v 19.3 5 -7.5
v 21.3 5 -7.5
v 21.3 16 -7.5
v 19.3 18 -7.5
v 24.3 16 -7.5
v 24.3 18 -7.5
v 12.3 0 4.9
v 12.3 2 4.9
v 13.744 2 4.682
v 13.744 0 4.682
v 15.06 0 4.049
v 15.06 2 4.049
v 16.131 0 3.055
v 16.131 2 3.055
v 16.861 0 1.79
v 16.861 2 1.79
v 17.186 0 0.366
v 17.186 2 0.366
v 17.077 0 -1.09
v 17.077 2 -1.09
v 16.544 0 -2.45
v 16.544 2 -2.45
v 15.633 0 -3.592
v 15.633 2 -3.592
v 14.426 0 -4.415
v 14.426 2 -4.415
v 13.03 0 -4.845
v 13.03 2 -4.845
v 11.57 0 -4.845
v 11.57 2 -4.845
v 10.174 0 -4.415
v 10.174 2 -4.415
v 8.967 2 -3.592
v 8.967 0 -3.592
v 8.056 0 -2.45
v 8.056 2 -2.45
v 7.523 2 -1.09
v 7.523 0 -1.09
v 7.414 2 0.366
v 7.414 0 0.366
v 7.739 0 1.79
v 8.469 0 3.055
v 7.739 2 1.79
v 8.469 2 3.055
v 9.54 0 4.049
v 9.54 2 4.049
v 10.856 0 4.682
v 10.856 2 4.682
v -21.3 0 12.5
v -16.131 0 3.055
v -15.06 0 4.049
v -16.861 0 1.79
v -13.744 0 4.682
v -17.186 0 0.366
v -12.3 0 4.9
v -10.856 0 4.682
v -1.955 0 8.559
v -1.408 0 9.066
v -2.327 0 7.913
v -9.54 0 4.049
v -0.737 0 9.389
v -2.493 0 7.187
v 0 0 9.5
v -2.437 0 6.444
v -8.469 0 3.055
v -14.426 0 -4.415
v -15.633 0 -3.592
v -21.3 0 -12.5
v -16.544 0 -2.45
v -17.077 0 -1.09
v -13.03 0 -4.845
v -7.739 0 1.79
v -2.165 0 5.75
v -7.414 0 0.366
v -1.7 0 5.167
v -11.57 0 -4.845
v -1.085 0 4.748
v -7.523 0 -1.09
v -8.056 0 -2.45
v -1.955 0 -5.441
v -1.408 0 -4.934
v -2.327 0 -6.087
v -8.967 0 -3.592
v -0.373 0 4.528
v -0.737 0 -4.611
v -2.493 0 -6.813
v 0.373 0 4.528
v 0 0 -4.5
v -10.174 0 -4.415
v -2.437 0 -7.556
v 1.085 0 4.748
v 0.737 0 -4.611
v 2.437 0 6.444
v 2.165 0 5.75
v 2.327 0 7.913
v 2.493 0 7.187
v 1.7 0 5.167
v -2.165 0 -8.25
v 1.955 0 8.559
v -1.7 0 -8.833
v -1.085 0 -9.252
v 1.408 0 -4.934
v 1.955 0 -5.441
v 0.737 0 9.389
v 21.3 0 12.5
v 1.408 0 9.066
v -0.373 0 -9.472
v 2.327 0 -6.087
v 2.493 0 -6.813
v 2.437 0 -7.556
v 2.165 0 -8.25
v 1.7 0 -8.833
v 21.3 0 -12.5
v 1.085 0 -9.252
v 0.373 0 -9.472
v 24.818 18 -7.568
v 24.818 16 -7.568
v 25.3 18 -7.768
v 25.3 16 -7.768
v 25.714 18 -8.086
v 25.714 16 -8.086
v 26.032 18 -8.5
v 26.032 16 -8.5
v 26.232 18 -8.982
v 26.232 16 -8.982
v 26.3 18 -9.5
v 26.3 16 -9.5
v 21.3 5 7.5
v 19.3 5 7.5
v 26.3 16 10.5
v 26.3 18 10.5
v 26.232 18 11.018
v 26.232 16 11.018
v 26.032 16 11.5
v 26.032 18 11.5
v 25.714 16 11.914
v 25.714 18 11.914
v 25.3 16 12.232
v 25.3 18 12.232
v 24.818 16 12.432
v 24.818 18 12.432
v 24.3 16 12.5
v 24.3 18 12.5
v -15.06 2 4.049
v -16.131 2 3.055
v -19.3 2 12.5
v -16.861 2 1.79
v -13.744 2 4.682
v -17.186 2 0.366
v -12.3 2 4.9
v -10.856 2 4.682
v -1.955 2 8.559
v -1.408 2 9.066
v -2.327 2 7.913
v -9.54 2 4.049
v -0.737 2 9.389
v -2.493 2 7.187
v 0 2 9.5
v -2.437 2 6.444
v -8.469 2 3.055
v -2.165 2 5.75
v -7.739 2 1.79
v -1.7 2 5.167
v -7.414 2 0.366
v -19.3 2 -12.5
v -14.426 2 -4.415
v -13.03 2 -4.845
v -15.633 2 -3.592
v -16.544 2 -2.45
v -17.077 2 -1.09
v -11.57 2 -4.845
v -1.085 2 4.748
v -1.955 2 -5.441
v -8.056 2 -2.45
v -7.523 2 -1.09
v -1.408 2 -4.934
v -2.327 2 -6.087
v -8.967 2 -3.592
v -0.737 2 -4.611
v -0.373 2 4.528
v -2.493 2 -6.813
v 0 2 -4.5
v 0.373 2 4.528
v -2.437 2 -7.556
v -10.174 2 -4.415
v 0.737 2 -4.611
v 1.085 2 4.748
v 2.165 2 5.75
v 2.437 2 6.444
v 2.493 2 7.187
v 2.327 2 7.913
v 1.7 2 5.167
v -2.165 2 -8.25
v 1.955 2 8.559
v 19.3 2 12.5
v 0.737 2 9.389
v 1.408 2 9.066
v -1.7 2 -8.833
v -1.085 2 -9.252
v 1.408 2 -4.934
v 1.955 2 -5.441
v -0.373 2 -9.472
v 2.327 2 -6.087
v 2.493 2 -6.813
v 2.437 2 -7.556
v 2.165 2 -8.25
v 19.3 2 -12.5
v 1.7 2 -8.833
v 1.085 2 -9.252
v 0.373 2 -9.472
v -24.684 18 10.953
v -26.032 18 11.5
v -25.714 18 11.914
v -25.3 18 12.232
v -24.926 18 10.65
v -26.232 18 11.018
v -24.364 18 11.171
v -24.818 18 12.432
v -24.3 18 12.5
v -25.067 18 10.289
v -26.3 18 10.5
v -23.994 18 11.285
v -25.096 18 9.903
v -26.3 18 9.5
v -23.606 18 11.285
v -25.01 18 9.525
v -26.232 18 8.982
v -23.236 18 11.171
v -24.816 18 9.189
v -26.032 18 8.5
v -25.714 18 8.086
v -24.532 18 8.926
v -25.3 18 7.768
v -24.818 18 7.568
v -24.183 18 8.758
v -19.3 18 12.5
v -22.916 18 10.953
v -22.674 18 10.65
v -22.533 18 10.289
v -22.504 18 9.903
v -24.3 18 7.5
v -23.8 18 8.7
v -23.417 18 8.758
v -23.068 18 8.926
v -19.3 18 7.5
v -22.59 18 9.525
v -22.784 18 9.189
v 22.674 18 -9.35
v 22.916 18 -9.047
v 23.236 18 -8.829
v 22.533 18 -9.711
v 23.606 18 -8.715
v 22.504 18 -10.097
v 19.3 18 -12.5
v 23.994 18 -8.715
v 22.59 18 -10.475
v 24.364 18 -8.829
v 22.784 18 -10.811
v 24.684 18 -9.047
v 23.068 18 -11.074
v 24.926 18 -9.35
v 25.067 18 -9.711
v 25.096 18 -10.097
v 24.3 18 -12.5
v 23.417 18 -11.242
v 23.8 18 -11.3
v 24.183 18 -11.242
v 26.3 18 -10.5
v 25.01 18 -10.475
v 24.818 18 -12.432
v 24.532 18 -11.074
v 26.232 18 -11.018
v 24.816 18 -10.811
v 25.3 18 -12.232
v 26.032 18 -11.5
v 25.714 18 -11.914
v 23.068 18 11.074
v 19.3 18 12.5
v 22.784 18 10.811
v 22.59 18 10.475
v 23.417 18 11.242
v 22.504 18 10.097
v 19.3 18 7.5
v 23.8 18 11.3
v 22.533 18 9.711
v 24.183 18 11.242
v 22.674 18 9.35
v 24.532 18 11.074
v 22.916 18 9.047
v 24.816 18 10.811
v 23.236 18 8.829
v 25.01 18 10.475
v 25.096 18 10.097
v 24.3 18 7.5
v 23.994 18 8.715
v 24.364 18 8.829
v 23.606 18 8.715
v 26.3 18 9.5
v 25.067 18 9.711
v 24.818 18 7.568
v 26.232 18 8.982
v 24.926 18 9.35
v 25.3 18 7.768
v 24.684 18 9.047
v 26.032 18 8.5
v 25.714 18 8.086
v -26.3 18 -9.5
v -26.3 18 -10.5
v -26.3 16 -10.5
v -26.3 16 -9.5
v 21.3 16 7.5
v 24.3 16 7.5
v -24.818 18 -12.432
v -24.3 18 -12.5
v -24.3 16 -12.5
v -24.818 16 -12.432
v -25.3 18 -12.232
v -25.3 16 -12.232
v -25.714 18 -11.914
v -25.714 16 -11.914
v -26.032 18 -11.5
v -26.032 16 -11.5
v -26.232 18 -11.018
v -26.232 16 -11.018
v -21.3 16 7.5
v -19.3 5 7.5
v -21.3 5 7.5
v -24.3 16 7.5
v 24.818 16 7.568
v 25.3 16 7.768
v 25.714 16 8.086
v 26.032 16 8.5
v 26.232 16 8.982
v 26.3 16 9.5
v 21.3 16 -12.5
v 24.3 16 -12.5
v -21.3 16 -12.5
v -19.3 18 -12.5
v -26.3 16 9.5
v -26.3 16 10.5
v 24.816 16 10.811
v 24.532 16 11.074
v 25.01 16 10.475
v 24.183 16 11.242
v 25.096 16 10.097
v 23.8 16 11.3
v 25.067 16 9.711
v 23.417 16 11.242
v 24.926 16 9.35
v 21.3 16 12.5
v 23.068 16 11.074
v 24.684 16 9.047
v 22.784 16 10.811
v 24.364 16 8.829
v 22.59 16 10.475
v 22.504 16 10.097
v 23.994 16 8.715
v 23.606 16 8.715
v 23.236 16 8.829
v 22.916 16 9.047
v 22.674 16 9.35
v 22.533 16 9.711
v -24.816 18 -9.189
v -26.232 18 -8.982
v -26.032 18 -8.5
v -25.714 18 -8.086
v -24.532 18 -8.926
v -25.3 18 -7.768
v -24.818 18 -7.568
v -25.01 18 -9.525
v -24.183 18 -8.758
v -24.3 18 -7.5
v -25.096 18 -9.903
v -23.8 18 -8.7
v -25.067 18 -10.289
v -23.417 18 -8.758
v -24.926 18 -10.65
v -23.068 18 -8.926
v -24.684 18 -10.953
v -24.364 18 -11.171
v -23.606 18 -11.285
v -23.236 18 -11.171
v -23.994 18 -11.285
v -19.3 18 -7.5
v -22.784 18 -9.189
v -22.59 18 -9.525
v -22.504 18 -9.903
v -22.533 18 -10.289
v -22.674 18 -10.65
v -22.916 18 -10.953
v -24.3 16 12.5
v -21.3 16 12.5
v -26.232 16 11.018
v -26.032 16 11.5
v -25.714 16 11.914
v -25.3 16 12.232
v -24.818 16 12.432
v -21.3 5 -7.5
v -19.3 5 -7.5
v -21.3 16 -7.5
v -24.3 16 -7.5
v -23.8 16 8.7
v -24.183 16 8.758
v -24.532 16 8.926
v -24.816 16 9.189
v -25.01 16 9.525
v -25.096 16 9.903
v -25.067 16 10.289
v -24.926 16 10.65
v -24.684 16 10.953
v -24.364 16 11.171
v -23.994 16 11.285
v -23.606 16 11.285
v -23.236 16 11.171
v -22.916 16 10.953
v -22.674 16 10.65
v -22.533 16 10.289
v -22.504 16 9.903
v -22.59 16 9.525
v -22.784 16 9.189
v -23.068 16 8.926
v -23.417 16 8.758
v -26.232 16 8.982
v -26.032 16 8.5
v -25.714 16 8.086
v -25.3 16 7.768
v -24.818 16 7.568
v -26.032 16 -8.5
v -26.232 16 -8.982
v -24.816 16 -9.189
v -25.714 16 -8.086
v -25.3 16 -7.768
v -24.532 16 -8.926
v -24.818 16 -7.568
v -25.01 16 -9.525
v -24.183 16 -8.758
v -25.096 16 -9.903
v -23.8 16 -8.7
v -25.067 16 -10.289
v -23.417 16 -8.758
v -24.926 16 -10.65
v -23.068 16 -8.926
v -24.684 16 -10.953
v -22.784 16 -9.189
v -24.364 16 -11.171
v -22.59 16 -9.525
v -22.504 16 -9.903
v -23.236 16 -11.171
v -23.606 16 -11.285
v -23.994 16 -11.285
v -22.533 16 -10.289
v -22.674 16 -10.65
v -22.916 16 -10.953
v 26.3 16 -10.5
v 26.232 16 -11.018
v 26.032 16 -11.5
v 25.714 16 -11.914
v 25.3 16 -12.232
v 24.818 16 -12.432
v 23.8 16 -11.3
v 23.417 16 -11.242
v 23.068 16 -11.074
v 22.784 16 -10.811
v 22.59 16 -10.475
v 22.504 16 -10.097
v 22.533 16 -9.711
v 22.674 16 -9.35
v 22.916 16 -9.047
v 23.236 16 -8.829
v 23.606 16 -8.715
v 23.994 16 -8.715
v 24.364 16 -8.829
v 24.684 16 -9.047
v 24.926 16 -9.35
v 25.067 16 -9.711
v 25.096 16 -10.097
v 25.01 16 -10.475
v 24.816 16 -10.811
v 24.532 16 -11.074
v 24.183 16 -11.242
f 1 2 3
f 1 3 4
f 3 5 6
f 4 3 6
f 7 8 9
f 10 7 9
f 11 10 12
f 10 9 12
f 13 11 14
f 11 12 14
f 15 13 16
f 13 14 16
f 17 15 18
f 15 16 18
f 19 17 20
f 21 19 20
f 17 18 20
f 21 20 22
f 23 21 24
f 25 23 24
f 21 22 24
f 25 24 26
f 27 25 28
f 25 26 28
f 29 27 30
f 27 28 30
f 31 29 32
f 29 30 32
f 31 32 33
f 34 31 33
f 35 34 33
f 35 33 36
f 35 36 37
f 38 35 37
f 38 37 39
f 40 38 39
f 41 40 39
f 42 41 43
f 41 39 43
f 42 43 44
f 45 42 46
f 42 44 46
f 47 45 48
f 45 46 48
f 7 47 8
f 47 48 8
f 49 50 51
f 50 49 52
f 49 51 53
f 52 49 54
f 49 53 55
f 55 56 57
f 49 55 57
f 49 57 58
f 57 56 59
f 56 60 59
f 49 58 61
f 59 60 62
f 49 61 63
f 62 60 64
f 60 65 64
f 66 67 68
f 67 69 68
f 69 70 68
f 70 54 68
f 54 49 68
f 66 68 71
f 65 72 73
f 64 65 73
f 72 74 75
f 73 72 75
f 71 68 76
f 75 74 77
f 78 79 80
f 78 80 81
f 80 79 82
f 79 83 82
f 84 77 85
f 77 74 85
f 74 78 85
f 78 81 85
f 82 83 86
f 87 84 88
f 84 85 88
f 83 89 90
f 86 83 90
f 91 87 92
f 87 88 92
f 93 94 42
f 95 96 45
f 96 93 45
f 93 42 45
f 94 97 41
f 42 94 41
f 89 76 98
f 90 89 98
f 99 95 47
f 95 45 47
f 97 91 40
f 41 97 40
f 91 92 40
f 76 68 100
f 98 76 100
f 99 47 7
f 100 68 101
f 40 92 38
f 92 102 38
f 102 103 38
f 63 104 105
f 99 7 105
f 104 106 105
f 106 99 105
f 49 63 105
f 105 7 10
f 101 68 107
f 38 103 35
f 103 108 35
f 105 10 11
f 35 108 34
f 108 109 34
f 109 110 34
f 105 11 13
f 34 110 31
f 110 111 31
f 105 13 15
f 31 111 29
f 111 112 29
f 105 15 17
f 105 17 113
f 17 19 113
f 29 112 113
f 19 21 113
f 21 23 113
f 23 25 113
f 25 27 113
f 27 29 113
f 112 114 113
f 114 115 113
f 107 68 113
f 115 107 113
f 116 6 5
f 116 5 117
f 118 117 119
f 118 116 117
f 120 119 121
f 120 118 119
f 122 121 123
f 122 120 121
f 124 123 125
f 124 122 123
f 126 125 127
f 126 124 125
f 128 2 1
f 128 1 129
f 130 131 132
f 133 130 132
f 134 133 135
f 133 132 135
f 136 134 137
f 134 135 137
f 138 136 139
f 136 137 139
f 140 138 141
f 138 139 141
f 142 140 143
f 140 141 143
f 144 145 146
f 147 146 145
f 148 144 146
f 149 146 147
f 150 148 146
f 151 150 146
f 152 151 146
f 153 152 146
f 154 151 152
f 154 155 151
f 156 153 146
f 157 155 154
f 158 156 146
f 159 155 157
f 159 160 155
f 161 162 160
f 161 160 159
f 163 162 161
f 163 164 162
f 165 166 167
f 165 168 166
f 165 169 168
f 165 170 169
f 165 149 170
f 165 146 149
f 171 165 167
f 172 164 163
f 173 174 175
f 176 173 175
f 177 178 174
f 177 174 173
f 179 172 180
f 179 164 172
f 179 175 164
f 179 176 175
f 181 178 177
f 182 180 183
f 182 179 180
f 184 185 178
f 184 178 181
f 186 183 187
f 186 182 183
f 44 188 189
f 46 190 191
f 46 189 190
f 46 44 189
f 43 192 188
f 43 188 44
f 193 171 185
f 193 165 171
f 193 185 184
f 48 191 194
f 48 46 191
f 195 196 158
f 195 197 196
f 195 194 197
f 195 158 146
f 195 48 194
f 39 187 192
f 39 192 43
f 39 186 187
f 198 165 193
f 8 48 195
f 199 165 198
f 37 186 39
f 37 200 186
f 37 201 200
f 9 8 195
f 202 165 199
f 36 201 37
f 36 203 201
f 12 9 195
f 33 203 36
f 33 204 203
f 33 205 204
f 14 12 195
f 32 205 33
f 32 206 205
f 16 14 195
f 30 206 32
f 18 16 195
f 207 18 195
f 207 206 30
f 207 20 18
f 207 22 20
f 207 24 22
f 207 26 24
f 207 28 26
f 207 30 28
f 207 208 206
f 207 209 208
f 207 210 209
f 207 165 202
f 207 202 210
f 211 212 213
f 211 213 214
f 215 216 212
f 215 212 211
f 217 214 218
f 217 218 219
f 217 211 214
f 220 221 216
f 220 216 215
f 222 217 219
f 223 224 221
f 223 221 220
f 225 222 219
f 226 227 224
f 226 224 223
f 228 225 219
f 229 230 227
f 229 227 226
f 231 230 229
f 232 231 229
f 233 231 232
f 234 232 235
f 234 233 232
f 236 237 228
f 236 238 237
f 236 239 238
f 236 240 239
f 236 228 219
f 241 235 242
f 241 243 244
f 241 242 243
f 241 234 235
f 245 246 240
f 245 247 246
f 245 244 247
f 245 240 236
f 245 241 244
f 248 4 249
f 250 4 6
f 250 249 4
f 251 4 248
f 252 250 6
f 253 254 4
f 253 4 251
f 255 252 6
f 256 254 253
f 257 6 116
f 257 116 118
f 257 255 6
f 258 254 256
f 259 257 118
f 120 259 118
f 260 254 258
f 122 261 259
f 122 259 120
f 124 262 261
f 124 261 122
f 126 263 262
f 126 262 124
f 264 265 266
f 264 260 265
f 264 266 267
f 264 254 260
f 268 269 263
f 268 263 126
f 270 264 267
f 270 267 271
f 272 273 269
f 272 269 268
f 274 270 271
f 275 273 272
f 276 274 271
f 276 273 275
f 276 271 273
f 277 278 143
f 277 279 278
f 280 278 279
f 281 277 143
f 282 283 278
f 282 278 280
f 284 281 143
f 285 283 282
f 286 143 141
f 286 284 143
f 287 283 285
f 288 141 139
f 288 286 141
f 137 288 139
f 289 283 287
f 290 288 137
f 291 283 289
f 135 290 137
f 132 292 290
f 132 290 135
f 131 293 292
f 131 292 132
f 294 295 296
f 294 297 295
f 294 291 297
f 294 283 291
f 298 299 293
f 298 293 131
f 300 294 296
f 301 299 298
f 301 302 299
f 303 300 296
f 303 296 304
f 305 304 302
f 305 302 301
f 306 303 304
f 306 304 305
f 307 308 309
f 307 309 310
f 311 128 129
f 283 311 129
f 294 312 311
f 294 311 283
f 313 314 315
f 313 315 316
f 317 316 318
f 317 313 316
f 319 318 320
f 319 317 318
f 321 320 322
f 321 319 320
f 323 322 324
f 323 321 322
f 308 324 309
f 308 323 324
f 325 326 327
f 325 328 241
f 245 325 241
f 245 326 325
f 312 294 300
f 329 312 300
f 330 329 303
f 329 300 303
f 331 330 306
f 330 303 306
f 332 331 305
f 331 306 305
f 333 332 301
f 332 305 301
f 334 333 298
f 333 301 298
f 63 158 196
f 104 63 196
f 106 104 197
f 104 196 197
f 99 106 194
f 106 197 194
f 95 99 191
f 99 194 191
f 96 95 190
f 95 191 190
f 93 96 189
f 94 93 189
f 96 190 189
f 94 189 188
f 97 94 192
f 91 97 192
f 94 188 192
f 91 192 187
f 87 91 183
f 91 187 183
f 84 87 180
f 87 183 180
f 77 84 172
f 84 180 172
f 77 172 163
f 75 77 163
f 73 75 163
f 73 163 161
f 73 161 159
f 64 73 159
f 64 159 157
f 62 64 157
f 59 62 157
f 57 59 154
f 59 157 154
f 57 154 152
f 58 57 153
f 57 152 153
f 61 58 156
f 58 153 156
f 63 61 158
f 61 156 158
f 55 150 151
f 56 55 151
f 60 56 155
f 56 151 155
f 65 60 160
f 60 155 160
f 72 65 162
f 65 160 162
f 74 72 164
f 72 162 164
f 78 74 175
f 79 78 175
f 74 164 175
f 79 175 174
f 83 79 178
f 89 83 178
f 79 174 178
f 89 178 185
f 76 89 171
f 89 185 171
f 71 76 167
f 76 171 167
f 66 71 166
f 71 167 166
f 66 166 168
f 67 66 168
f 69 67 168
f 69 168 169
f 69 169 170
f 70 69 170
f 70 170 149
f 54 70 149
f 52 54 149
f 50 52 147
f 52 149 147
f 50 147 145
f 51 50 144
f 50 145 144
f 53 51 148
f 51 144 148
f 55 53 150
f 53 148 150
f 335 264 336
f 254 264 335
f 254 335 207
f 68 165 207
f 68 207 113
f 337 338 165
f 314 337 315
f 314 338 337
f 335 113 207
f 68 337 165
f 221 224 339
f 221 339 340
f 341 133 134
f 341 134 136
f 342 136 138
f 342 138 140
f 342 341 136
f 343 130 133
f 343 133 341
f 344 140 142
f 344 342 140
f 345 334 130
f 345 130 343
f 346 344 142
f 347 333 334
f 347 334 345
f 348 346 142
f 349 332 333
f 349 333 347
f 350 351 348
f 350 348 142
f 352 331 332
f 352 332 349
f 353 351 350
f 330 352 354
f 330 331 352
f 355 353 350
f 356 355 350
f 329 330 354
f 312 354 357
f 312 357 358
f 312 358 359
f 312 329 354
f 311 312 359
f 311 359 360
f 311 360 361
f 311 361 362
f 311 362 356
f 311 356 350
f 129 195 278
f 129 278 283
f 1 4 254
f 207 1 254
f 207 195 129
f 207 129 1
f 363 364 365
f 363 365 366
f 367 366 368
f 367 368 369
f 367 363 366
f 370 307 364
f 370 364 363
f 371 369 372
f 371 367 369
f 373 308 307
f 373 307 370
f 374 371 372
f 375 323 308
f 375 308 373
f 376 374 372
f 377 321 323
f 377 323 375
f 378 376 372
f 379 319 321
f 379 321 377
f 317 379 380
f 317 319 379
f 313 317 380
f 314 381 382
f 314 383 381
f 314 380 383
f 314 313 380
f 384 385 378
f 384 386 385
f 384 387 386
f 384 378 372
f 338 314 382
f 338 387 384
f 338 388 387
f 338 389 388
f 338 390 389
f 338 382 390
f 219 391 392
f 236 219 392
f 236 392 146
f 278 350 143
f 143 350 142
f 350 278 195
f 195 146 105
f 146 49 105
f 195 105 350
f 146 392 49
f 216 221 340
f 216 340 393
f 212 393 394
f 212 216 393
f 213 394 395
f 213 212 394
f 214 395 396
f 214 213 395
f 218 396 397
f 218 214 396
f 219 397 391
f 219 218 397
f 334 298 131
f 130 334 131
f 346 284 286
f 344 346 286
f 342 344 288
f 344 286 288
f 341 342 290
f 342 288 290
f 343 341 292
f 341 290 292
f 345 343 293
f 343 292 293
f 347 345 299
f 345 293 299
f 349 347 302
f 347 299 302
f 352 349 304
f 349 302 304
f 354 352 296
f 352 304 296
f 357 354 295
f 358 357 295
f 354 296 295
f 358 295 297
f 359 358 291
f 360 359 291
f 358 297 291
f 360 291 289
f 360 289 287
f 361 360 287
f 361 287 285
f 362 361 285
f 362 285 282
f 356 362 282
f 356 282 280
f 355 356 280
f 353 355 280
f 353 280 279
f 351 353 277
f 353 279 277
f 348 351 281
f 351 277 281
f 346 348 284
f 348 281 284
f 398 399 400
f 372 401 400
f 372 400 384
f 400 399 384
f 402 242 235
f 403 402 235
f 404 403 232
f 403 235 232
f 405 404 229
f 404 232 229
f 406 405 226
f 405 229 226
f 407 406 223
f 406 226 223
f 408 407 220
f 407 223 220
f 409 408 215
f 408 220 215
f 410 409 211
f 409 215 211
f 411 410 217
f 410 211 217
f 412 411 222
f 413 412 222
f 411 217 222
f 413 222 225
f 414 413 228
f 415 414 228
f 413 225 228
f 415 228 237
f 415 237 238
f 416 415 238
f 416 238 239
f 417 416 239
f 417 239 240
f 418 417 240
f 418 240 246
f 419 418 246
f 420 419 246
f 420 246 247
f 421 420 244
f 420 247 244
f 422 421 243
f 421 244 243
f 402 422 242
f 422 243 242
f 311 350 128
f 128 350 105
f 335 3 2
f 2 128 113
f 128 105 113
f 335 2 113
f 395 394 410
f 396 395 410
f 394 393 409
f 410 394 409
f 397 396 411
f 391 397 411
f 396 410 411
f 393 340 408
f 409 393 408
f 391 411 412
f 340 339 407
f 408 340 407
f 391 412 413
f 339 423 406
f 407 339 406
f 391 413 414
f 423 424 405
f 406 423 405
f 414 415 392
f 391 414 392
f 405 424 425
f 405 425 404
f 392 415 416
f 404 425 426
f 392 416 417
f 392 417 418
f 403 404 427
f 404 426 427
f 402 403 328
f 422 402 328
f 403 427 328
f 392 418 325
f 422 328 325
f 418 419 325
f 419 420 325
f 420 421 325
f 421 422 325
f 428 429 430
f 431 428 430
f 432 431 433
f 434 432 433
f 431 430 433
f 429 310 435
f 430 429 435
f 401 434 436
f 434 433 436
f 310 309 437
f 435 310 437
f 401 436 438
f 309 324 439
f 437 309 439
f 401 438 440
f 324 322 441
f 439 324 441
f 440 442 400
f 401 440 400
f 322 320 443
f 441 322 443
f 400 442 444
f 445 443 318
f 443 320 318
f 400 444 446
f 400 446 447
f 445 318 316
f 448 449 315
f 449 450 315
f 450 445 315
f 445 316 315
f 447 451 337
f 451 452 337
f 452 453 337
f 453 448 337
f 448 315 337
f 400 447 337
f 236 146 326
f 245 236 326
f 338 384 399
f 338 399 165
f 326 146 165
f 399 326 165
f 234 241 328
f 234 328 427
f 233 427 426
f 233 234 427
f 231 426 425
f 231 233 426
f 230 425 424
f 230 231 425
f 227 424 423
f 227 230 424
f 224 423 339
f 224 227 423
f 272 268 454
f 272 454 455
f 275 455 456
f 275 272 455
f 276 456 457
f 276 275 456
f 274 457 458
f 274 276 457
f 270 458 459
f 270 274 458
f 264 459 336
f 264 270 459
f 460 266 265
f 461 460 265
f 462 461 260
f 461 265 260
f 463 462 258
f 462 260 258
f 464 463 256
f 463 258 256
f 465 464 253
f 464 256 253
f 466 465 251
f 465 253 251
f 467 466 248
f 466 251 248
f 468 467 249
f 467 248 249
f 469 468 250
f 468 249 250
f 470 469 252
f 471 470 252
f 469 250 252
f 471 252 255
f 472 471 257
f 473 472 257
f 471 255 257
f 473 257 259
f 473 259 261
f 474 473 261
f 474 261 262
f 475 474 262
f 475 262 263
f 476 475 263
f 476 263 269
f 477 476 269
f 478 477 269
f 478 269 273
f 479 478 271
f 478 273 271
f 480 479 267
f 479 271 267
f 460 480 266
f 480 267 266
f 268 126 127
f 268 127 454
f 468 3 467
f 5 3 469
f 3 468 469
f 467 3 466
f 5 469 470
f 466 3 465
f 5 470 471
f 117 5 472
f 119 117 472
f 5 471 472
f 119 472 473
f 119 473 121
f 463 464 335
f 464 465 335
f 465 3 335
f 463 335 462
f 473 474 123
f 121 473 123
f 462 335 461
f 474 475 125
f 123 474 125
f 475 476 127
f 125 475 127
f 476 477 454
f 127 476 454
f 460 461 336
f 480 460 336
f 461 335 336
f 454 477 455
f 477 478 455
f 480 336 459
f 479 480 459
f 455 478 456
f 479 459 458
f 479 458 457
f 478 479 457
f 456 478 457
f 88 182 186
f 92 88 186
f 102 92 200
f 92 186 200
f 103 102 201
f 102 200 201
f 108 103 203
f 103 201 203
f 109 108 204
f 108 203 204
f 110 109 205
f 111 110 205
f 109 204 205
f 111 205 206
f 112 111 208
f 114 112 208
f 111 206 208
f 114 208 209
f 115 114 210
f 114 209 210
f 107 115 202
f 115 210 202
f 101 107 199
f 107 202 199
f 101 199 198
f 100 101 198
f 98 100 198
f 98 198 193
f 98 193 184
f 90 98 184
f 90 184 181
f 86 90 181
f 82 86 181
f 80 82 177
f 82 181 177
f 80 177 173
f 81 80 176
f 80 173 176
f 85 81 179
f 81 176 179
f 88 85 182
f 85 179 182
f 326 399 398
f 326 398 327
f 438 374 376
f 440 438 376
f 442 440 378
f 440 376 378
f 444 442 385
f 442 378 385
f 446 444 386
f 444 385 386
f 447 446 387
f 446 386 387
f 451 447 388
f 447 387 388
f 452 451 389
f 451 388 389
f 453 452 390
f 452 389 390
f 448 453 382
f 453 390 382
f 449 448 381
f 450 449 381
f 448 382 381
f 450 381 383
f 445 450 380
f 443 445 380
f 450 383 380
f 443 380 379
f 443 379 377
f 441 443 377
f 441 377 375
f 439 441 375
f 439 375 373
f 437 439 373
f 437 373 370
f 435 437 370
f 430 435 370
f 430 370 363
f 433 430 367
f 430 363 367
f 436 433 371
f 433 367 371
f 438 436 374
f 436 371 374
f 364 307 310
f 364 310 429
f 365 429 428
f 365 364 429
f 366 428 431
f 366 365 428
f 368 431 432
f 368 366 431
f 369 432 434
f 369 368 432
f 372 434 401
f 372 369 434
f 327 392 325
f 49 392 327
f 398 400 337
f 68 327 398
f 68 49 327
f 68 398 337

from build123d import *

# Parameters (mm, degrees)
SZKIC1_W                        = 42.6
SZKIC1_H                        = 25
DODANIE_WYCI_GNI_CIE2_DEPTH     = 18
SKORUPA5_T                      = -2
SZKIC2_R                        = 1.3
DODANIE_WYCI_GNI_CIE3_DEPTH     = 2
SZKIC3_R                        = 4.9
SZKIC3_R_2                      = 2.5
WYTNIJ_WYCI_GNI_CIE1_DEPTH      = 2
WYTNIJ_WYCI_GNI_CIE2_DEPTH      = 53.402385442
WYTNIJ_WYCI_GNI_CIE2_DEPTH_BACK = 53.402385442
SZKIC4_W                        = 15
SZKIC4_H                        = 13


with BuildPart() as part:
    # Szkic1 → Dodanie-wyciągnięcie2 (new body)
    with BuildSketch(Plane(origin=(0, 0, 0), x_dir=(1, 0, 0), z_dir=(0, 1, 0))):
        Rectangle(SZKIC1_W, SZKIC1_H)
    extrude(amount=DODANIE_WYCI_GNI_CIE2_DEPTH)

    # Skorupa5
    skorupa5_openings = [part.faces().sort_by_distance(p)[0] for p in [
        (0, 18, 0),
        (0, 9, -12.5),
        (0, 9, 12.5),
    ]]
    offset(amount=SKORUPA5_T, openings=skorupa5_openings, kind=Kind.INTERSECTION)

    # Szkic2 → Dodanie-wyciągnięcie3 (add)
    # profile 1 of 4: a face of its own
    with BuildSketch(Plane(origin=(0, 18, 0), x_dir=(1, 0, 0), z_dir=(0, 1, 0))):
        with BuildLine():
            Line((-21.3, 12.5), (-24.3, 12.5))
            ThreePointArc((-24.3, 12.5), (-25.714213562, 11.914213562), (-26.3, 10.5))
            Line((-26.3, 10.5), (-26.3, 9.5))
            ThreePointArc((-26.3, 9.5), (-25.714213562, 8.085786438), (-24.3, 7.5))
            Line((-24.3, 7.5), (-21.3, 7.5))
            Line((-21.3, 7.5), (-21.3, 12.5))
        make_face()
        with Locations(Location((-23.8, 10, 0), (0, 0, 270))):
            Circle(SZKIC2_R, mode=Mode.SUBTRACT)
    # profile 2 of 4: a face of its own
    with BuildSketch(Plane(origin=(0, 18, 0), x_dir=(1, 0, 0), z_dir=(0, 1, 0))):
        with BuildLine():
            Line((-21.3, -7.5), (-24.3, -7.5))
            ThreePointArc((-24.3, -7.5), (-25.714213562, -8.085786438), (-26.3, -9.5))
            Line((-26.3, -9.5), (-26.3, -10.5))
            ThreePointArc((-26.3, -10.5), (-25.714213562, -11.914213562), (-24.3, -12.5))
            Line((-24.3, -12.5), (-21.3, -12.5))
            Line((-21.3, -12.5), (-21.3, -7.5))
        make_face()
        with Locations(Location((-23.8, -10, 0), (0, 0, 90))):
            Circle(SZKIC2_R, mode=Mode.SUBTRACT)
    # profile 3 of 4: a face of its own
    with BuildSketch(Plane(origin=(0, 18, 0), x_dir=(1, 0, 0), z_dir=(0, 1, 0))):
        with BuildLine():
            Line((21.3, -12.5), (21.3, -7.5))
            Line((21.3, -7.5), (24.3, -7.5))
            ThreePointArc((24.3, -7.5), (25.714213562, -8.085786438), (26.3, -9.5))
            Line((26.3, -9.5), (26.3, -10.5))
            ThreePointArc((26.3, -10.5), (25.714213562, -11.914213562), (24.3, -12.5))
            Line((24.3, -12.5), (21.3, -12.5))
        make_face()
        with Locations(Location((23.8, -10, 0), (0, 0, 270))):
            Circle(SZKIC2_R, mode=Mode.SUBTRACT)
    # profile 4 of 4: a face of its own
    with BuildSketch(Plane(origin=(0, 18, 0), x_dir=(1, 0, 0), z_dir=(0, 1, 0))):
        with BuildLine():
            Line((21.3, 7.5), (24.3, 7.5))
            ThreePointArc((24.3, 7.5), (25.714213562, 8.085786438), (26.3, 9.5))
            Line((26.3, 9.5), (26.3, 10.5))
            ThreePointArc((26.3, 10.5), (25.714213562, 11.914213562), (24.3, 12.5))
            Line((24.3, 12.5), (21.3, 12.5))
            Line((21.3, 12.5), (21.3, 7.5))
        make_face()
        with Locations(Location((23.8, 10, 0), (0, 0, 90))):
            Circle(SZKIC2_R, mode=Mode.SUBTRACT)
    extrude(amount=-DODANIE_WYCI_GNI_CIE3_DEPTH)

    # Szkic3 → Wytnij-wyciągnięcie1 (cut)
    with BuildSketch(Plane(origin=(0, 2, 0), x_dir=(1, 0, 0), z_dir=(0, 1, 0))):
        with Locations(Location((-12.3, 0, 0), (0, 0, 270))):
            Circle(SZKIC3_R)
        with Locations(Location((12.3, 0, 0), (0, 0, 270))):
            Circle(SZKIC3_R)
        with Locations(Location((0, 7, 0), (0, 0, 270))):
            Circle(SZKIC3_R_2)
        with Locations(Location((0, -7, 0), (0, 0, 270))):
            Circle(SZKIC3_R_2)
    extrude(amount=-WYTNIJ_WYCI_GNI_CIE1_DEPTH, mode=Mode.SUBTRACT)

    # Szkic4 → Wytnij-wyciągnięcie2 (cut, two sides: drawn at the far end of the back side and taken through both)
    with BuildSketch(Plane.ZY.offset(21.3).offset(-WYTNIJ_WYCI_GNI_CIE2_DEPTH_BACK)):
        with Locations((0, 11.5)):
            Rectangle(SZKIC4_W, SZKIC4_H)
    extrude(amount=WYTNIJ_WYCI_GNI_CIE2_DEPTH + WYTNIJ_WYCI_GNI_CIE2_DEPTH_BACK, mode=Mode.SUBTRACT)


solid = part.part
